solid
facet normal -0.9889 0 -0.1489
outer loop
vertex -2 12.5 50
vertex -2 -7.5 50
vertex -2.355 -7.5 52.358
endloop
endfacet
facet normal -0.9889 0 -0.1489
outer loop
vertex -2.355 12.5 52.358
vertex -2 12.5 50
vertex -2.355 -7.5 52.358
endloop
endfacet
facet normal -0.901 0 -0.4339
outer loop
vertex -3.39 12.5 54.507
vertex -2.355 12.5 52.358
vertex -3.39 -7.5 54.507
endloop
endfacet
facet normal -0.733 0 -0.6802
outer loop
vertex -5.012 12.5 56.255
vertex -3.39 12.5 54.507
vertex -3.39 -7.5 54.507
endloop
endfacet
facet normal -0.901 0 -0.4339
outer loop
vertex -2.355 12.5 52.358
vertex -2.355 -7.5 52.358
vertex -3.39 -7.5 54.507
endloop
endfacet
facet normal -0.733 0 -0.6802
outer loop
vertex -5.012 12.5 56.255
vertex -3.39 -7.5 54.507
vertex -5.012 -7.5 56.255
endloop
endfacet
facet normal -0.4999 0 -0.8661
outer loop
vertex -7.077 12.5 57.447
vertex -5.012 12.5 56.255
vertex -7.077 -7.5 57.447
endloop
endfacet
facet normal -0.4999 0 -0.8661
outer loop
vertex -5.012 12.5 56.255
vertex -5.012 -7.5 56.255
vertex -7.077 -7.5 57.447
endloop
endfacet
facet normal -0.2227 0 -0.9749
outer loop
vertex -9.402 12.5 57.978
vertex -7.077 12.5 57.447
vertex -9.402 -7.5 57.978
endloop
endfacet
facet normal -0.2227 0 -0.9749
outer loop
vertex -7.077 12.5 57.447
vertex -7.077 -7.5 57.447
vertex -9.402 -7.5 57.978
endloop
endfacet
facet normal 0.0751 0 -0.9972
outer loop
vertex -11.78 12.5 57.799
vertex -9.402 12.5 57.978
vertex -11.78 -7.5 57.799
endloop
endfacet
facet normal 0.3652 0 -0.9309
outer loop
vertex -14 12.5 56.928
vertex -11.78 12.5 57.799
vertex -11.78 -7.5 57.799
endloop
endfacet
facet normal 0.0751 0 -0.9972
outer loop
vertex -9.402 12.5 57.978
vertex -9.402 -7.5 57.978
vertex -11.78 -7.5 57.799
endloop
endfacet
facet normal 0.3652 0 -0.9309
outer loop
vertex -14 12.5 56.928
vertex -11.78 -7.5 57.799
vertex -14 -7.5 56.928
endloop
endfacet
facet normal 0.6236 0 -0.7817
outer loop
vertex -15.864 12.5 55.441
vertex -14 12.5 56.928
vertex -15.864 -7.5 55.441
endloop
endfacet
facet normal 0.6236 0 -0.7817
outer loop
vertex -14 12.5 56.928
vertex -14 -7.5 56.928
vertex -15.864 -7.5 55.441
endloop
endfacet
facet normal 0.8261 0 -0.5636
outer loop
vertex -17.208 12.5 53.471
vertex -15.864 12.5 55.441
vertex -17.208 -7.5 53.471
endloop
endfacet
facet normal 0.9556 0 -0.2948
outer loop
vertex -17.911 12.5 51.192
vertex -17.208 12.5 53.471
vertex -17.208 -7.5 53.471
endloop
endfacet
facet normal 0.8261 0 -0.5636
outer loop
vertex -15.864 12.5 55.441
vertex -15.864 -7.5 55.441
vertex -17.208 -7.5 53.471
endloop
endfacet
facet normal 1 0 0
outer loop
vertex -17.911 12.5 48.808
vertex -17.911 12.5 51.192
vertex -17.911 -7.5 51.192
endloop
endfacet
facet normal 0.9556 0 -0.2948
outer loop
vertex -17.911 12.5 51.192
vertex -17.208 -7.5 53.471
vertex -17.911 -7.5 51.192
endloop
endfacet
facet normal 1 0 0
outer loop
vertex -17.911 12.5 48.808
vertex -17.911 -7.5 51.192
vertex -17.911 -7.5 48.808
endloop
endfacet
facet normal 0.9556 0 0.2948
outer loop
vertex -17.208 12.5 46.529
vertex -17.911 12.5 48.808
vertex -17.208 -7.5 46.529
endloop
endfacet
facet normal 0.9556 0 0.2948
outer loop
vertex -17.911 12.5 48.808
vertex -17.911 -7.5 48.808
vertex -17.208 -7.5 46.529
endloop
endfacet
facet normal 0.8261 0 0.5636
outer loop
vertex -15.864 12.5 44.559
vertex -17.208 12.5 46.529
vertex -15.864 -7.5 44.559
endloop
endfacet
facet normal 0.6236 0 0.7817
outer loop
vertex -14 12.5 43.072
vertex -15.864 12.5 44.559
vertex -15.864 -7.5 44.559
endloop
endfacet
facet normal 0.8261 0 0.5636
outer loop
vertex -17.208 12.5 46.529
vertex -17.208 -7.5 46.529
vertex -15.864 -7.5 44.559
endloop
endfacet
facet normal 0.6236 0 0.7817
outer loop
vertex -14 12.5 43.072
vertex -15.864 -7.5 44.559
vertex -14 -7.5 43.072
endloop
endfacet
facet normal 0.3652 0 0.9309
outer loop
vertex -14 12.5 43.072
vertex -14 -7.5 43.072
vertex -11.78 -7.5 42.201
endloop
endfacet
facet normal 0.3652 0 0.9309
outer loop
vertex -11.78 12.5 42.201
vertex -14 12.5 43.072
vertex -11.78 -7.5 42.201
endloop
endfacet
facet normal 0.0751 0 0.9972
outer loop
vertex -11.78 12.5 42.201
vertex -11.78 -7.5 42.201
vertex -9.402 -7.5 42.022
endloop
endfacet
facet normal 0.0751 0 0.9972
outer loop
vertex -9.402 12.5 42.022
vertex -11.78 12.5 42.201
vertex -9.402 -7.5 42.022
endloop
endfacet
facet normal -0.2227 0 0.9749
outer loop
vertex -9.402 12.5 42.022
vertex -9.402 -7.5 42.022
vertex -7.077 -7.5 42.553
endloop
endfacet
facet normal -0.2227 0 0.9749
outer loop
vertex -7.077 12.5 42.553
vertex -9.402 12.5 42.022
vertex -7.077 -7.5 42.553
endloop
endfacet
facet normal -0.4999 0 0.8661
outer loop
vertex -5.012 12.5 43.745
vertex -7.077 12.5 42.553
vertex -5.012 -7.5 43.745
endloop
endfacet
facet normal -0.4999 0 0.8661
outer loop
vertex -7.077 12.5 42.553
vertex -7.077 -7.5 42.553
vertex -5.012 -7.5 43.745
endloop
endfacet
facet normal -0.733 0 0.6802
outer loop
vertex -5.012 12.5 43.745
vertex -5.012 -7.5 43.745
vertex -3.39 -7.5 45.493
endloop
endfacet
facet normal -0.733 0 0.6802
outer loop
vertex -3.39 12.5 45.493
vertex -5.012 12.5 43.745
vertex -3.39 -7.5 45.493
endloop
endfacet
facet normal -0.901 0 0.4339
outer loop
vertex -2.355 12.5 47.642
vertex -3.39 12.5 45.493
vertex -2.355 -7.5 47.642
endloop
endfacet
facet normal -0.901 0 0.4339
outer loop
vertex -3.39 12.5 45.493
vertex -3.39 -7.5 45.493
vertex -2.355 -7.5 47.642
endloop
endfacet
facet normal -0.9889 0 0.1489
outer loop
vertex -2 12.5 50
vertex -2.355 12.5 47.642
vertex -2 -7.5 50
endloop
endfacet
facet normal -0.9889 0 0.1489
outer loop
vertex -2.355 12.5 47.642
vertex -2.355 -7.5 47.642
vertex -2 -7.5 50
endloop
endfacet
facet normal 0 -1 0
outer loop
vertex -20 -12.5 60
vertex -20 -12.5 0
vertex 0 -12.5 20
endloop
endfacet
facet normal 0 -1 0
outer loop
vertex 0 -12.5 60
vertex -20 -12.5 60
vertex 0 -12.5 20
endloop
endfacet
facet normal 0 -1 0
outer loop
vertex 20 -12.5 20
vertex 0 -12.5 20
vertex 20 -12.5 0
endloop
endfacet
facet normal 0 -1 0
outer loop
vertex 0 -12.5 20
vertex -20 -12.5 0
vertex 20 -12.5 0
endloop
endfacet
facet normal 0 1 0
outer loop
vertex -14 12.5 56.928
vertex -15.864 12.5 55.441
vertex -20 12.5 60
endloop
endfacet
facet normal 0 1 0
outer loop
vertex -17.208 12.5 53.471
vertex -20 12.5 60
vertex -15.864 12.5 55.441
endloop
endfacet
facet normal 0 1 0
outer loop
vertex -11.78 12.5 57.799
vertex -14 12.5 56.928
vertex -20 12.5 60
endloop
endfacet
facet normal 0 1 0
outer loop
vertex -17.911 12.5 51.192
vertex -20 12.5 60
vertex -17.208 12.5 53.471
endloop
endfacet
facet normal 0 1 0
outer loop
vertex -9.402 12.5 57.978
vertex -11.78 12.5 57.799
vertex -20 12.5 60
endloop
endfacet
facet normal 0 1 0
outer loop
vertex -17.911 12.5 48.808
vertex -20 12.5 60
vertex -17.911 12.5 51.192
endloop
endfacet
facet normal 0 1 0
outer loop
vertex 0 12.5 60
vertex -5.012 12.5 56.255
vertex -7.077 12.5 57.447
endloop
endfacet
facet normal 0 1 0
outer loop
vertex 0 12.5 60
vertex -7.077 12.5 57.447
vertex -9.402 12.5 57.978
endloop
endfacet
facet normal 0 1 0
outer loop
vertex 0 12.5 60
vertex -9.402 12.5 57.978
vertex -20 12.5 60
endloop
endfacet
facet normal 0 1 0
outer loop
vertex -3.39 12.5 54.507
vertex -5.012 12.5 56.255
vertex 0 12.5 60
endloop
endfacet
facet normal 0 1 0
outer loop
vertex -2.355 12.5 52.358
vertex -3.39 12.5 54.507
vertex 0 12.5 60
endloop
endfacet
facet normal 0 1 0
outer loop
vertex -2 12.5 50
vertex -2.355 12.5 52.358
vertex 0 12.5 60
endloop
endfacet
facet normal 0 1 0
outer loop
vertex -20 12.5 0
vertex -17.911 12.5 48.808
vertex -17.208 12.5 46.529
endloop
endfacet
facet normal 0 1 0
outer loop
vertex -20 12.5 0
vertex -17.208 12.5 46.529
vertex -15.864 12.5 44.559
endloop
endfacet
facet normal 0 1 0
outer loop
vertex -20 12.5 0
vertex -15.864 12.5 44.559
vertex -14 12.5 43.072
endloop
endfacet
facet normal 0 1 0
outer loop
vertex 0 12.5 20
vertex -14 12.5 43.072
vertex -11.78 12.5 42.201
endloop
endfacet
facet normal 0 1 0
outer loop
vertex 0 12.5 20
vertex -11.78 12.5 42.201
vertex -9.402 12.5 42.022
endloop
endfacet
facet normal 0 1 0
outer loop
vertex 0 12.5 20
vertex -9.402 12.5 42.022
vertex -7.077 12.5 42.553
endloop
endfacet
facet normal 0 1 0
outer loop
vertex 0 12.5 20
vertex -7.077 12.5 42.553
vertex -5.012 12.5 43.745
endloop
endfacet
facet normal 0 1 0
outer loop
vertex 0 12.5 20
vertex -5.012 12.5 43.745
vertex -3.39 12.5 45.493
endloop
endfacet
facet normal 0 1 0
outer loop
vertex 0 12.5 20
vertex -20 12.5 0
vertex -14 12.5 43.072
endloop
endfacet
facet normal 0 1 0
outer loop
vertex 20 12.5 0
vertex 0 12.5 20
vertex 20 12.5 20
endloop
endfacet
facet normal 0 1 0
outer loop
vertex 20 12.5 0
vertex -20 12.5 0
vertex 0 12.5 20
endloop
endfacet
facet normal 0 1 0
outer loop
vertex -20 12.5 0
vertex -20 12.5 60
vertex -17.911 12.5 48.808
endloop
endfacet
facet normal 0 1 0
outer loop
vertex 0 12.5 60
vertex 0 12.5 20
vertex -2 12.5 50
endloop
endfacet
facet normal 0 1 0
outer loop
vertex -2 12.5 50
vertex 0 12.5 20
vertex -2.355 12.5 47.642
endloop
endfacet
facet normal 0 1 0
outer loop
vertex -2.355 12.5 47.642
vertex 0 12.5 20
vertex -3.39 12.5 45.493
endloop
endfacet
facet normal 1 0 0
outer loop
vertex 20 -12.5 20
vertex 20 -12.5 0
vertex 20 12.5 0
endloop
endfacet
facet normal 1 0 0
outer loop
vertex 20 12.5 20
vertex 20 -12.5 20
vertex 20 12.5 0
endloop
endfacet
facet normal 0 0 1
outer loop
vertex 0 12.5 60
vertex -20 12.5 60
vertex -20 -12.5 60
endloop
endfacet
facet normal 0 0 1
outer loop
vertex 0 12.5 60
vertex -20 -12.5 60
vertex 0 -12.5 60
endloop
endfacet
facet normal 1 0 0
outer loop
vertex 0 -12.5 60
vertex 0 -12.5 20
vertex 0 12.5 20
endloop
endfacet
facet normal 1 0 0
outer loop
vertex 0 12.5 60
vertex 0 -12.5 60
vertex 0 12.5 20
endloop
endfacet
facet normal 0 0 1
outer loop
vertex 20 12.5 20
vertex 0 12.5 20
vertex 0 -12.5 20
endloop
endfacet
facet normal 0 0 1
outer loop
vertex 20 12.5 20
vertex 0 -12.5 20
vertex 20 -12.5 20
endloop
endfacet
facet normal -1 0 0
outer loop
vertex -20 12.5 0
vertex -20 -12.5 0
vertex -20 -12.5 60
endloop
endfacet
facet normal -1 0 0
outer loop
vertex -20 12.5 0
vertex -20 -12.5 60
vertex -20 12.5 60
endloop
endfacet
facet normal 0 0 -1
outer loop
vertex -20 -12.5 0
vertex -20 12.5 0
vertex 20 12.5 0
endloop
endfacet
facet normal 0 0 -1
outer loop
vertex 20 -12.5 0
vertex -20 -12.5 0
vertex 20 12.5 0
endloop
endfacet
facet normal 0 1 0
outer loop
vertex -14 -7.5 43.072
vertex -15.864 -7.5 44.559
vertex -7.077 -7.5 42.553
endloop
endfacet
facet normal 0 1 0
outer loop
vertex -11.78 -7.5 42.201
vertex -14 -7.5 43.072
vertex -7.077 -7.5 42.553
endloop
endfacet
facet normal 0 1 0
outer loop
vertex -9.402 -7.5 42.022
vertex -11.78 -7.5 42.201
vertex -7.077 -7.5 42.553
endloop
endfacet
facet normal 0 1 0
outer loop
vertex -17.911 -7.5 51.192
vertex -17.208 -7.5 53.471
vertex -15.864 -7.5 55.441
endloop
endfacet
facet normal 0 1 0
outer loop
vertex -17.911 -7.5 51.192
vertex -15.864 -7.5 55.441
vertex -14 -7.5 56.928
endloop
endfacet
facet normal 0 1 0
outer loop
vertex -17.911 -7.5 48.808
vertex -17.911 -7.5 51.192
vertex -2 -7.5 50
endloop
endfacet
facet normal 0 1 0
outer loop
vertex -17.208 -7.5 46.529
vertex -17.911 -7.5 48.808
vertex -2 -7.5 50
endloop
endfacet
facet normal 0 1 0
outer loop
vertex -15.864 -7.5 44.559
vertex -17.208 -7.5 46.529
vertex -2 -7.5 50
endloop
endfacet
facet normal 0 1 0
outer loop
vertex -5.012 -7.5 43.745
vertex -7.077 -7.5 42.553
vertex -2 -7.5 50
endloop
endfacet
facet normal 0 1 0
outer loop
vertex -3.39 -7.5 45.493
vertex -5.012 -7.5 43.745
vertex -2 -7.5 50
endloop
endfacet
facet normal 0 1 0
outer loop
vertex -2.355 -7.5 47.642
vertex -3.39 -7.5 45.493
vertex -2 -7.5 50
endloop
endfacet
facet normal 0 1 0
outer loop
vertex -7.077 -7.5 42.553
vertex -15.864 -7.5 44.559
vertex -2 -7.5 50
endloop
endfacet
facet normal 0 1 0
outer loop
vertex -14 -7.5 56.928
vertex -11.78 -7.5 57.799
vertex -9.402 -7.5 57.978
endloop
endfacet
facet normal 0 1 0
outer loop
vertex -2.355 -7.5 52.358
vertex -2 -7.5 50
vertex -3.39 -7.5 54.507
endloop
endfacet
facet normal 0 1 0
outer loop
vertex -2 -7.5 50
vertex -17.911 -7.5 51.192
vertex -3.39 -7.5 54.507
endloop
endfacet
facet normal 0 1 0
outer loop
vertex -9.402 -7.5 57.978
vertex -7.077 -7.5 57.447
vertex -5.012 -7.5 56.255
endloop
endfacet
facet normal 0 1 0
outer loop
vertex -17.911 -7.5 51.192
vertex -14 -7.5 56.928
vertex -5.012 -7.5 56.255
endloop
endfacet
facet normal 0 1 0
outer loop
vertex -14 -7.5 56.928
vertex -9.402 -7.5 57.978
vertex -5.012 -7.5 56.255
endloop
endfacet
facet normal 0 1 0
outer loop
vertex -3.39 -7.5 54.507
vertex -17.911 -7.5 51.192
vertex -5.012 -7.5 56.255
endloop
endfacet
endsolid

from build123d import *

# Parameters (mm, degrees)
F0_W     = 20
F0_H     = 25
F1_DEPTH = 60
F2_DEPTH = 20
F4_START = -5
F3_R     = 8
F4_DEPTH = 20


with BuildPart() as f1:
    # F0 (on Top) → F1 (new body)
    with BuildSketch(Plane.XY):
        with Locations((-10, 0)):
            Rectangle(F0_W, F0_H)
    extrude(amount=F1_DEPTH)

    # F0 (on Top) → F2 (join)
    with BuildSketch(Plane.XY):
        with Locations((10, 0)):
            Rectangle(F0_W, F0_H)
    extrude(amount=F2_DEPTH)

    # F3 (on face) → F4 (cut)
    with BuildSketch(Plane.XZ.offset(12.5).offset(F4_START)):
        with Locations((-10, 50)):
            Circle(F3_R)
    extrude(amount=-F4_DEPTH, mode=Mode.SUBTRACT)


solid = f1.part
